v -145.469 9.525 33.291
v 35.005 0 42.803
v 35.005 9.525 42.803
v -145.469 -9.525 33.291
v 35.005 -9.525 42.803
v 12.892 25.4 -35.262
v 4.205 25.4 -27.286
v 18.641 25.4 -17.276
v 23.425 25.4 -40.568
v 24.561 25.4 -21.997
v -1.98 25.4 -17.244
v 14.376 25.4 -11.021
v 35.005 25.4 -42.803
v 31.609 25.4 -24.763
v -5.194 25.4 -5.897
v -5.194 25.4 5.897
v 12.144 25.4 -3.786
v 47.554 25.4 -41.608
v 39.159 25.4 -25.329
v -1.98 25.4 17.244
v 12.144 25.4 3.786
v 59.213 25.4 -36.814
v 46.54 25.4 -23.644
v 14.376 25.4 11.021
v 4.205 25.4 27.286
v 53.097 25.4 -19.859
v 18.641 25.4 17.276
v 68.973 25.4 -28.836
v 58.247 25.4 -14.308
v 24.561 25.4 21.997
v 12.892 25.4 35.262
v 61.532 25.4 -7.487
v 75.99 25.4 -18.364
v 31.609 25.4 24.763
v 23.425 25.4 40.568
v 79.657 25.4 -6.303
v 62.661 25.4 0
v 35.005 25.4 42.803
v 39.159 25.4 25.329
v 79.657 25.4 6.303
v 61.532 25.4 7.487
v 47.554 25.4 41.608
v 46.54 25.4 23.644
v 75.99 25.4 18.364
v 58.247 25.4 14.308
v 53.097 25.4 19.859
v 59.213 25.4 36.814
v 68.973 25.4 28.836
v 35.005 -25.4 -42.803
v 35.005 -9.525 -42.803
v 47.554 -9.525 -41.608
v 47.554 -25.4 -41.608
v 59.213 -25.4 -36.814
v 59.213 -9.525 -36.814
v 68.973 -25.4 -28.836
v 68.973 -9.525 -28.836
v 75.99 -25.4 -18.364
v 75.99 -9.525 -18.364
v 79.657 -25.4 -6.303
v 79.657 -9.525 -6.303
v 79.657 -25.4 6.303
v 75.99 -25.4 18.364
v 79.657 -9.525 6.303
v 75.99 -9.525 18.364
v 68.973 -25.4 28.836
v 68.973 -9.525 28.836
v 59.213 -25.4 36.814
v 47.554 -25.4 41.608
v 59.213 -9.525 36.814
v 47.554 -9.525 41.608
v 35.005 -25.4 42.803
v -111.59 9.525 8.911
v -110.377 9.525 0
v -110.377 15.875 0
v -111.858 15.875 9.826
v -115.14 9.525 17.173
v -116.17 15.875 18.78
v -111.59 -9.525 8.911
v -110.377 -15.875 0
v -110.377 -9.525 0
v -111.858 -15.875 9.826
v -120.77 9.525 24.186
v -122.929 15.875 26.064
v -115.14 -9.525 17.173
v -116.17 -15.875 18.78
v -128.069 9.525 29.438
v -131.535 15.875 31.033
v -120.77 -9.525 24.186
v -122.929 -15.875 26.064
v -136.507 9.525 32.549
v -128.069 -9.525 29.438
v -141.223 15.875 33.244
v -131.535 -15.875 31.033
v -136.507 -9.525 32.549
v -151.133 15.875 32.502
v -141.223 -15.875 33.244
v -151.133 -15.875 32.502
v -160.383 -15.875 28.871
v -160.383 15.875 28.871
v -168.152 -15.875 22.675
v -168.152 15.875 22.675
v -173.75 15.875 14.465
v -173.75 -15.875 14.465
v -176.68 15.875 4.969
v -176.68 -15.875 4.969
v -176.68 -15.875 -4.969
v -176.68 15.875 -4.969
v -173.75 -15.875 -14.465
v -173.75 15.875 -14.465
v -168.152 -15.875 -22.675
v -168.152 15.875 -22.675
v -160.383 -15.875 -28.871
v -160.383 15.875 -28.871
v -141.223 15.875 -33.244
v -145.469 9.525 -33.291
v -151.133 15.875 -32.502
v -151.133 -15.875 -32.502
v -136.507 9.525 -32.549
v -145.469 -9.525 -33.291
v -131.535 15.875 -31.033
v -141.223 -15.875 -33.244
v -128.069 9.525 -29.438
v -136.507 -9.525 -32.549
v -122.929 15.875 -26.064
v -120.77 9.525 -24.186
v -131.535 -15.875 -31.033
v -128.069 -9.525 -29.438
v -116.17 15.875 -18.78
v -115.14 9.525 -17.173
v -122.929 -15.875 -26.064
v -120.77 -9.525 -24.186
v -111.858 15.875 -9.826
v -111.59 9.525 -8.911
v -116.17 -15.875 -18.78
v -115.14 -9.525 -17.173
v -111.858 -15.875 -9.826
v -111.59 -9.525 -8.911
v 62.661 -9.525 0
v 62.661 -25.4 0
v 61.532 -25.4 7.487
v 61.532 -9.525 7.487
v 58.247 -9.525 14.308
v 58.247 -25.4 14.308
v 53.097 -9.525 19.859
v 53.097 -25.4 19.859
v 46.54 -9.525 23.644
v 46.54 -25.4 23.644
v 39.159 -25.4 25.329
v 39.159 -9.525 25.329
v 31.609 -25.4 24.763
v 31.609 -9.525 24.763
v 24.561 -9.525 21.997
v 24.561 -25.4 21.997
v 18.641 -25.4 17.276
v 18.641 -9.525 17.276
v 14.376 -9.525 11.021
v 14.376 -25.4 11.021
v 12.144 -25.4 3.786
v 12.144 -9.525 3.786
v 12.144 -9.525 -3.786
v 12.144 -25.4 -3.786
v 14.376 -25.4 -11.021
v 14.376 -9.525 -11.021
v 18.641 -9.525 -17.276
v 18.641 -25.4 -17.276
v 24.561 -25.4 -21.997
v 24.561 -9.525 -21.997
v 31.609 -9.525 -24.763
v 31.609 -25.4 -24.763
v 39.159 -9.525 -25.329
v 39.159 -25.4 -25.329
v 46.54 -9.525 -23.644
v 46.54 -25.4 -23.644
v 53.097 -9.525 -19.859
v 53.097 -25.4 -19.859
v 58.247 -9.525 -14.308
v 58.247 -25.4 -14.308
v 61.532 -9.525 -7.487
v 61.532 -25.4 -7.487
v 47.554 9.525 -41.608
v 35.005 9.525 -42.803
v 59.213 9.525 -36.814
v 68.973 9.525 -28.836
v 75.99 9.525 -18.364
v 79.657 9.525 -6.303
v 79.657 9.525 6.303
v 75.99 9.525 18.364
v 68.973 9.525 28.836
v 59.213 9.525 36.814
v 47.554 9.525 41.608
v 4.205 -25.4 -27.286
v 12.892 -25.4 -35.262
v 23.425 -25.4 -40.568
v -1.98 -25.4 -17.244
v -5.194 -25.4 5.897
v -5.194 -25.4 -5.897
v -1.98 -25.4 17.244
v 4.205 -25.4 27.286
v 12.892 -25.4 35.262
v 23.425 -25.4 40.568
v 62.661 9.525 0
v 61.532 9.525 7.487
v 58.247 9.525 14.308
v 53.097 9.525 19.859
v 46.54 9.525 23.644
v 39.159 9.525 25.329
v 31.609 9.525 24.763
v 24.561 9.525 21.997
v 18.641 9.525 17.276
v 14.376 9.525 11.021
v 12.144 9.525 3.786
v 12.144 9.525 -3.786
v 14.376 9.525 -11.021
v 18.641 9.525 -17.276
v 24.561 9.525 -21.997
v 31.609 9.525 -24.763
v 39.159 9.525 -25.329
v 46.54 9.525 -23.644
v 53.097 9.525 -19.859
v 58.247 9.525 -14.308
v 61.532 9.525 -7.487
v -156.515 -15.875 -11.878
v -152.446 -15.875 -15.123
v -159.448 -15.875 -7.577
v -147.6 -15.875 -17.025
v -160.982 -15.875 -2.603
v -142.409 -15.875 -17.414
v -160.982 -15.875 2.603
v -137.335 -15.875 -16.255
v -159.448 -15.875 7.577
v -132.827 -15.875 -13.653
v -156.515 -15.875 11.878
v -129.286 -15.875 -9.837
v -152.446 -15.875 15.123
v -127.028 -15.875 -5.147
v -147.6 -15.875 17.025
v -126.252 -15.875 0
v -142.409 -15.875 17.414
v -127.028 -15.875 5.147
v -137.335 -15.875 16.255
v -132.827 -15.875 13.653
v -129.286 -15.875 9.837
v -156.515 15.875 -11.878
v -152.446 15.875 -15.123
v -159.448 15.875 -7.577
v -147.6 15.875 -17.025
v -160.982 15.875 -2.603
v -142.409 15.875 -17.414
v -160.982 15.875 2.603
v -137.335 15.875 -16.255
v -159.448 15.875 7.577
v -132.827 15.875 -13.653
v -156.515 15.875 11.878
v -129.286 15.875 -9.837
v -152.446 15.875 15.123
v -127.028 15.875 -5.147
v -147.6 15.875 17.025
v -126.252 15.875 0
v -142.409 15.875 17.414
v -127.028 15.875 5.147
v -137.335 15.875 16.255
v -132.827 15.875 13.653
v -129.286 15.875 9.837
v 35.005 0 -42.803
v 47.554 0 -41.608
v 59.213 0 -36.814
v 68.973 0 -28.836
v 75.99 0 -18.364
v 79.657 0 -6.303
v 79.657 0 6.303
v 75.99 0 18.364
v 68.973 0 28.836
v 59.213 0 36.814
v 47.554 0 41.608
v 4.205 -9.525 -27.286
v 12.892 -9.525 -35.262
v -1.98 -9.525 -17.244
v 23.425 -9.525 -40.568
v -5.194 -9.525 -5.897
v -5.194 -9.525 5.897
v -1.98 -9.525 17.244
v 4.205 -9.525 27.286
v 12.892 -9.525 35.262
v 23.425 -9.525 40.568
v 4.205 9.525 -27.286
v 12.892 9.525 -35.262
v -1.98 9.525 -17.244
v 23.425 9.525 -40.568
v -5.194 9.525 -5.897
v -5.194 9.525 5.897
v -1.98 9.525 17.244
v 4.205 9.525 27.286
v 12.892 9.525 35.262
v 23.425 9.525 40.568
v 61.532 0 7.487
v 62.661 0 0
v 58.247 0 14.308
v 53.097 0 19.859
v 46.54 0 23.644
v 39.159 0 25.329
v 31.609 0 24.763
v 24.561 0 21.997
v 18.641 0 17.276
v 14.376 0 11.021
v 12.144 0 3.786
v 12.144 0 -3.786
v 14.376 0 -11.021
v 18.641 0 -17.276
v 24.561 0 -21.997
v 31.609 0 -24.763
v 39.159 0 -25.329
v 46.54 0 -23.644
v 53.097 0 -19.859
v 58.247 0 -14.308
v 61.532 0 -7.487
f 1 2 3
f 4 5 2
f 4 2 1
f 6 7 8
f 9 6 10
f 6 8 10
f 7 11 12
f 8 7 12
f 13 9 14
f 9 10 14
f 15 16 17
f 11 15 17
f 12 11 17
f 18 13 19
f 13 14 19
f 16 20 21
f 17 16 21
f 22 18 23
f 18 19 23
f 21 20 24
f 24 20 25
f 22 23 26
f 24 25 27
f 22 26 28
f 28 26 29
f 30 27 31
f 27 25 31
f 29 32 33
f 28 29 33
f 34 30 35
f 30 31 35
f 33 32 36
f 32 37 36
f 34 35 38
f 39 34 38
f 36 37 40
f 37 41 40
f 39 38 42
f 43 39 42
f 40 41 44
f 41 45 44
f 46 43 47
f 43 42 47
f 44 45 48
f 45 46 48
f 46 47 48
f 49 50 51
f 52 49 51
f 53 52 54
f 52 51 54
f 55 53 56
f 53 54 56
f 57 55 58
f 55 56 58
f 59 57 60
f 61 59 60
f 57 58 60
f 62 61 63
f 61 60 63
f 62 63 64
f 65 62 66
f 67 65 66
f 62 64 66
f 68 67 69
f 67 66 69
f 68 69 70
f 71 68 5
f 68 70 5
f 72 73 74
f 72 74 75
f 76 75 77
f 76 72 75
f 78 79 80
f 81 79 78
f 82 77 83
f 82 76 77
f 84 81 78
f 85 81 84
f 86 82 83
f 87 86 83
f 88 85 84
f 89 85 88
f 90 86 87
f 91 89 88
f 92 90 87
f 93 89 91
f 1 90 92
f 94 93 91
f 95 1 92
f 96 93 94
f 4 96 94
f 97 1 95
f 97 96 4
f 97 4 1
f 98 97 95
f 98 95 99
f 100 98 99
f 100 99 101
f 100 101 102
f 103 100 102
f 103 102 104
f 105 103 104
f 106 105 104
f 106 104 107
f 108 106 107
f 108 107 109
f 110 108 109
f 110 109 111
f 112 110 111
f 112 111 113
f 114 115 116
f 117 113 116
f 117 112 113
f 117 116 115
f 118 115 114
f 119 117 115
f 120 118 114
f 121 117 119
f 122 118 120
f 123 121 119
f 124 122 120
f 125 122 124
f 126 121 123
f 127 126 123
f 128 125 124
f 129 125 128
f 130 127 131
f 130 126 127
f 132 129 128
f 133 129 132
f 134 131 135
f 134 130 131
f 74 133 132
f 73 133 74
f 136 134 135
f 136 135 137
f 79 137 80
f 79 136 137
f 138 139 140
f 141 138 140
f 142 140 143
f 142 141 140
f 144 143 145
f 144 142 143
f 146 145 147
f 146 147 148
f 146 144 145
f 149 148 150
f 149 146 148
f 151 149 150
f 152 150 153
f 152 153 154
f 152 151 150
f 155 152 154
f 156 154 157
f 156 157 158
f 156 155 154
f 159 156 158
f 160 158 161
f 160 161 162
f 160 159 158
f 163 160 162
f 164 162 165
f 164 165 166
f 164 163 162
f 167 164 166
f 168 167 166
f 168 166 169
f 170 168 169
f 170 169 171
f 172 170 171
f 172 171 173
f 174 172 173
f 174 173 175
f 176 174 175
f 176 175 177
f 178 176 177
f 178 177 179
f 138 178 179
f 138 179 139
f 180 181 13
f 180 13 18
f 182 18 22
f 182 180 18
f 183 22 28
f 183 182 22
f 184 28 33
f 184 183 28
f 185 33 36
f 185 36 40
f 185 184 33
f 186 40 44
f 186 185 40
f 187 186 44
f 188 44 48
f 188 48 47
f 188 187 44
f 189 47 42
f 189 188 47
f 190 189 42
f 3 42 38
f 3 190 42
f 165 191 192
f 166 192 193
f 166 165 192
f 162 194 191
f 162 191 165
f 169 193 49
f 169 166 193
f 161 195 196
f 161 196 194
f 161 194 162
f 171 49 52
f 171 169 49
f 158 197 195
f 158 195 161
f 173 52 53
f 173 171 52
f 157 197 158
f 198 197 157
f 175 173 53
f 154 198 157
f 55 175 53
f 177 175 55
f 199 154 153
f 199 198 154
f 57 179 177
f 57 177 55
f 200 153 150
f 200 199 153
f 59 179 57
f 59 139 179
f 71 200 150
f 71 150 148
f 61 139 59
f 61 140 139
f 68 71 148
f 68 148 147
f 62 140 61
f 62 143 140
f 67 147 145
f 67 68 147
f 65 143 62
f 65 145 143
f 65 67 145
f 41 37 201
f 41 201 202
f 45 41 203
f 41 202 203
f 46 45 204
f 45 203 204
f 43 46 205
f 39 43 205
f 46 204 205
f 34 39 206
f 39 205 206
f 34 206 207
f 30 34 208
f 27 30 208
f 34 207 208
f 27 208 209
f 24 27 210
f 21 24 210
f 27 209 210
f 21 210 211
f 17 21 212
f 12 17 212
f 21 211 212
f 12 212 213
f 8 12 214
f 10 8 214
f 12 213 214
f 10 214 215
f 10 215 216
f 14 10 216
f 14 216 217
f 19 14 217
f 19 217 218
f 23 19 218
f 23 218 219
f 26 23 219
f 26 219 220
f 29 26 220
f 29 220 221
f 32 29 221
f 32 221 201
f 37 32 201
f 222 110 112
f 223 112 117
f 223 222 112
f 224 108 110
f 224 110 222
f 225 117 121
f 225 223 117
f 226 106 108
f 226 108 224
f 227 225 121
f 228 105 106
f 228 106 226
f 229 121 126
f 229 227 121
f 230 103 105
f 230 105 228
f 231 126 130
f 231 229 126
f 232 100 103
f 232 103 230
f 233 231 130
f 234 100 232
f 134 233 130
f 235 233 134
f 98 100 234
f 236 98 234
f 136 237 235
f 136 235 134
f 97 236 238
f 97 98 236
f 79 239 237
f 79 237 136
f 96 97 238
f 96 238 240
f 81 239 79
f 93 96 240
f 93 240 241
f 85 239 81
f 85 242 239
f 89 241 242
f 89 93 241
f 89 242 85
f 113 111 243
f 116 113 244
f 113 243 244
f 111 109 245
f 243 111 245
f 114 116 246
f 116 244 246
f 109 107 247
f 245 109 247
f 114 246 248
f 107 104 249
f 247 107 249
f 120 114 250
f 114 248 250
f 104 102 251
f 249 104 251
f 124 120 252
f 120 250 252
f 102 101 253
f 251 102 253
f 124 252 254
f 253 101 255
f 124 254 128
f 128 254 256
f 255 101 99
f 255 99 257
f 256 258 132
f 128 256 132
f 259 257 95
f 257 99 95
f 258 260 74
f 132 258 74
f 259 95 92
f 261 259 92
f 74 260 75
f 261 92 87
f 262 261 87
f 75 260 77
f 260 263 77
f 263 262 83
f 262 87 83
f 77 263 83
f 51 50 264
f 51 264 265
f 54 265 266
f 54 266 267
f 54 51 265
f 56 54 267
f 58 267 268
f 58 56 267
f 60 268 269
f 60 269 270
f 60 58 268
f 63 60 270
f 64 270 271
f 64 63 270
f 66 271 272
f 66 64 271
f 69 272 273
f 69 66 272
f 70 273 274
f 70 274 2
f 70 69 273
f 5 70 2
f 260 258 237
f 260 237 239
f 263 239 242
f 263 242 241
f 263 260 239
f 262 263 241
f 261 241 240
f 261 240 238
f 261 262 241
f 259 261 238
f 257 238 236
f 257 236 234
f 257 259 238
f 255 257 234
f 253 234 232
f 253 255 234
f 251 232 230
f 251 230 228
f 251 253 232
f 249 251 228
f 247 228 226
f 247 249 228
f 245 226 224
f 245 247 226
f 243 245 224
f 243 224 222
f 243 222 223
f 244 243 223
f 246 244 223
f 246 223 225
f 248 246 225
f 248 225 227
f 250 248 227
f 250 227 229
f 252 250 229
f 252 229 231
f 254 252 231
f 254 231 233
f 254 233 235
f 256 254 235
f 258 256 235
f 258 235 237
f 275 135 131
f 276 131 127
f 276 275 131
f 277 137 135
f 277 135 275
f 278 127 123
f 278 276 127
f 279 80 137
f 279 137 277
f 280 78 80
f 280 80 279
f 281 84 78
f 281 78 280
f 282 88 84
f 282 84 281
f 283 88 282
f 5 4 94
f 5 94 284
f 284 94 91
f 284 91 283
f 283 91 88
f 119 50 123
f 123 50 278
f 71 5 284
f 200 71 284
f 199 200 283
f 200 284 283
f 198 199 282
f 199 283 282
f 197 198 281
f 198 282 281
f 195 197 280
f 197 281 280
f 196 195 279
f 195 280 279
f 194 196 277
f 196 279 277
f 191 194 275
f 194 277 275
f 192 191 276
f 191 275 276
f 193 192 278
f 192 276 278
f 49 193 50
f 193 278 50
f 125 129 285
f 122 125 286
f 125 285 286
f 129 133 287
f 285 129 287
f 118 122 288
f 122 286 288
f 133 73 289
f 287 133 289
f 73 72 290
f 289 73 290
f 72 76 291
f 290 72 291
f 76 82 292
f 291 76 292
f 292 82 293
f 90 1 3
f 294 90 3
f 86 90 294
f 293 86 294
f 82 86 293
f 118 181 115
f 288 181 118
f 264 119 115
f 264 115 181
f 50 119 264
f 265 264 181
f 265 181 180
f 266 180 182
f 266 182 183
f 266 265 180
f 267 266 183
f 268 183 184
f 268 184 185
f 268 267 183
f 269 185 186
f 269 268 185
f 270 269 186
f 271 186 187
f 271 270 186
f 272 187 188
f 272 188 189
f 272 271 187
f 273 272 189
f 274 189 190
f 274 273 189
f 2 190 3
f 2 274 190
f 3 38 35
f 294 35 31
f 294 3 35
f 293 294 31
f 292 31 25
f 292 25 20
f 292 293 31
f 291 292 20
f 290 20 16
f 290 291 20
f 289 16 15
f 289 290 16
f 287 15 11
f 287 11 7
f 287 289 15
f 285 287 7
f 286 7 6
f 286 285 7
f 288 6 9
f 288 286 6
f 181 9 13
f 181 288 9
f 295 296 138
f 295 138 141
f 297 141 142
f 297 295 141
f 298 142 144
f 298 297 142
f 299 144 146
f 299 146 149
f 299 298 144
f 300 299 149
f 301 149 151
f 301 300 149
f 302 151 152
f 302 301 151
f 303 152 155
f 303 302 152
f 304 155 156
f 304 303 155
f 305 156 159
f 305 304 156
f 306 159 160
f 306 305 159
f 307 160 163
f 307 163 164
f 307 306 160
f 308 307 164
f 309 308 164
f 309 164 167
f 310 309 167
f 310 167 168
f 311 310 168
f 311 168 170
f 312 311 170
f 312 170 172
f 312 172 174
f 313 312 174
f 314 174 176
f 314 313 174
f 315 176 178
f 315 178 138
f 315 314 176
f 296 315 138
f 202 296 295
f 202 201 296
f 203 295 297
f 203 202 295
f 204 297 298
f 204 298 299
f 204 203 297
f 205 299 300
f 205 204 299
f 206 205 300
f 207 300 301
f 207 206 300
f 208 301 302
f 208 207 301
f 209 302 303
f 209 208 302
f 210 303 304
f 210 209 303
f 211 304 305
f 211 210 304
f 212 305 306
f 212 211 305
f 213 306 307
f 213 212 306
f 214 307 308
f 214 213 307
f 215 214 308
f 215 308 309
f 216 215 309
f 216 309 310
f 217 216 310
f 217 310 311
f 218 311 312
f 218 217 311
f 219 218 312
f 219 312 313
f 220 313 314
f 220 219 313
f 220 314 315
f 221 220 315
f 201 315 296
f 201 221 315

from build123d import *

# Parameters (mm, degrees)
F0_R     = 17.4625
F0_R_2   = 25.4
F1_DEPTH = 9.525
F2_DEPTH = 25.4
F3_DEPTH = 15.875


with BuildPart() as f1:
    # F0 (on Front) → F1 (new body, symmetric)
    with BuildSketch(Plane.XZ):
        with BuildLine():
            ThreePointArc((-145.4689772406, -33.2912941566), (-120.7699308937, -24.185564488), (-110.3768719775, 0))
            ThreePointArc((-110.3768719775, 0), (-120.7699308937, 24.185564488), (-145.4689772406, 33.2912941566))
            ThreePointArc((-145.4689772406, 33.2912941566), (-177.0518719775, 0), (-145.4689772406, -33.2912941566))
        make_face()
        with Locations((-143.7143719775, 0)):
            Circle(F0_R, mode=Mode.SUBTRACT)
        with BuildLine():
            ThreePointArc((-145.4689772406, 33.2912941566), (-120.7699308937, 24.185564488), (-110.3768719775, 0))
            ThreePointArc((-110.3768719775, 0), (-120.7699308937, -24.185564488), (-145.4689772406, -33.2912941566))
            Line((-145.4689772406, -33.2912941566), (35.0047069699, -42.803092487))
            ThreePointArc((35.0047069699, -42.803092487), (-5.6018719775, 0), (35.0047069699, 42.803092487))
            Line((35.0047069699, 42.803092487), (-145.4689772406, 33.2912941566))
        make_face()
        with BuildLine():
            ThreePointArc((80.1231280225, 0), (66.7606237016, 31.0957257703), (35.0047069699, 42.803092487))
            ThreePointArc((35.0047069699, 42.803092487), (-5.6018719775, 0), (35.0047069699, -42.803092487))
            ThreePointArc((35.0047069699, -42.803092487), (66.7606237016, -31.0957257703), (80.1231280225, 0))
        make_face()
        with Locations((37.2606280225, 0)):
            Circle(F0_R_2, mode=Mode.SUBTRACT)
    extrude(amount=F1_DEPTH, both=True)

    # F0 (on Front) → F2 (join, symmetric)
    with BuildSketch(Plane.XZ):
        with BuildLine():
            ThreePointArc((80.1231280225, 0), (66.7606237016, 31.0957257703), (35.0047069699, 42.803092487))
            ThreePointArc((35.0047069699, 42.803092487), (-5.6018719775, 0), (35.0047069699, -42.803092487))
            ThreePointArc((35.0047069699, -42.803092487), (66.7606237016, -31.0957257703), (80.1231280225, 0))
        make_face()
        with Locations((37.2606280225, 0)):
            Circle(F0_R_2, mode=Mode.SUBTRACT)
    extrude(amount=F2_DEPTH, both=True)

    # F0 (on Front) → F3 (join, symmetric)
    with BuildSketch(Plane.XZ):
        with BuildLine():
            ThreePointArc((-145.4689772406, -33.2912941566), (-120.7699308937, -24.185564488), (-110.3768719775, 0))
            ThreePointArc((-110.3768719775, 0), (-120.7699308937, 24.185564488), (-145.4689772406, 33.2912941566))
            ThreePointArc((-145.4689772406, 33.2912941566), (-177.0518719775, 0), (-145.4689772406, -33.2912941566))
        make_face()
        with Locations((-143.7143719775, 0)):
            Circle(F0_R, mode=Mode.SUBTRACT)
    extrude(amount=F3_DEPTH, both=True)


solid = f1.part
